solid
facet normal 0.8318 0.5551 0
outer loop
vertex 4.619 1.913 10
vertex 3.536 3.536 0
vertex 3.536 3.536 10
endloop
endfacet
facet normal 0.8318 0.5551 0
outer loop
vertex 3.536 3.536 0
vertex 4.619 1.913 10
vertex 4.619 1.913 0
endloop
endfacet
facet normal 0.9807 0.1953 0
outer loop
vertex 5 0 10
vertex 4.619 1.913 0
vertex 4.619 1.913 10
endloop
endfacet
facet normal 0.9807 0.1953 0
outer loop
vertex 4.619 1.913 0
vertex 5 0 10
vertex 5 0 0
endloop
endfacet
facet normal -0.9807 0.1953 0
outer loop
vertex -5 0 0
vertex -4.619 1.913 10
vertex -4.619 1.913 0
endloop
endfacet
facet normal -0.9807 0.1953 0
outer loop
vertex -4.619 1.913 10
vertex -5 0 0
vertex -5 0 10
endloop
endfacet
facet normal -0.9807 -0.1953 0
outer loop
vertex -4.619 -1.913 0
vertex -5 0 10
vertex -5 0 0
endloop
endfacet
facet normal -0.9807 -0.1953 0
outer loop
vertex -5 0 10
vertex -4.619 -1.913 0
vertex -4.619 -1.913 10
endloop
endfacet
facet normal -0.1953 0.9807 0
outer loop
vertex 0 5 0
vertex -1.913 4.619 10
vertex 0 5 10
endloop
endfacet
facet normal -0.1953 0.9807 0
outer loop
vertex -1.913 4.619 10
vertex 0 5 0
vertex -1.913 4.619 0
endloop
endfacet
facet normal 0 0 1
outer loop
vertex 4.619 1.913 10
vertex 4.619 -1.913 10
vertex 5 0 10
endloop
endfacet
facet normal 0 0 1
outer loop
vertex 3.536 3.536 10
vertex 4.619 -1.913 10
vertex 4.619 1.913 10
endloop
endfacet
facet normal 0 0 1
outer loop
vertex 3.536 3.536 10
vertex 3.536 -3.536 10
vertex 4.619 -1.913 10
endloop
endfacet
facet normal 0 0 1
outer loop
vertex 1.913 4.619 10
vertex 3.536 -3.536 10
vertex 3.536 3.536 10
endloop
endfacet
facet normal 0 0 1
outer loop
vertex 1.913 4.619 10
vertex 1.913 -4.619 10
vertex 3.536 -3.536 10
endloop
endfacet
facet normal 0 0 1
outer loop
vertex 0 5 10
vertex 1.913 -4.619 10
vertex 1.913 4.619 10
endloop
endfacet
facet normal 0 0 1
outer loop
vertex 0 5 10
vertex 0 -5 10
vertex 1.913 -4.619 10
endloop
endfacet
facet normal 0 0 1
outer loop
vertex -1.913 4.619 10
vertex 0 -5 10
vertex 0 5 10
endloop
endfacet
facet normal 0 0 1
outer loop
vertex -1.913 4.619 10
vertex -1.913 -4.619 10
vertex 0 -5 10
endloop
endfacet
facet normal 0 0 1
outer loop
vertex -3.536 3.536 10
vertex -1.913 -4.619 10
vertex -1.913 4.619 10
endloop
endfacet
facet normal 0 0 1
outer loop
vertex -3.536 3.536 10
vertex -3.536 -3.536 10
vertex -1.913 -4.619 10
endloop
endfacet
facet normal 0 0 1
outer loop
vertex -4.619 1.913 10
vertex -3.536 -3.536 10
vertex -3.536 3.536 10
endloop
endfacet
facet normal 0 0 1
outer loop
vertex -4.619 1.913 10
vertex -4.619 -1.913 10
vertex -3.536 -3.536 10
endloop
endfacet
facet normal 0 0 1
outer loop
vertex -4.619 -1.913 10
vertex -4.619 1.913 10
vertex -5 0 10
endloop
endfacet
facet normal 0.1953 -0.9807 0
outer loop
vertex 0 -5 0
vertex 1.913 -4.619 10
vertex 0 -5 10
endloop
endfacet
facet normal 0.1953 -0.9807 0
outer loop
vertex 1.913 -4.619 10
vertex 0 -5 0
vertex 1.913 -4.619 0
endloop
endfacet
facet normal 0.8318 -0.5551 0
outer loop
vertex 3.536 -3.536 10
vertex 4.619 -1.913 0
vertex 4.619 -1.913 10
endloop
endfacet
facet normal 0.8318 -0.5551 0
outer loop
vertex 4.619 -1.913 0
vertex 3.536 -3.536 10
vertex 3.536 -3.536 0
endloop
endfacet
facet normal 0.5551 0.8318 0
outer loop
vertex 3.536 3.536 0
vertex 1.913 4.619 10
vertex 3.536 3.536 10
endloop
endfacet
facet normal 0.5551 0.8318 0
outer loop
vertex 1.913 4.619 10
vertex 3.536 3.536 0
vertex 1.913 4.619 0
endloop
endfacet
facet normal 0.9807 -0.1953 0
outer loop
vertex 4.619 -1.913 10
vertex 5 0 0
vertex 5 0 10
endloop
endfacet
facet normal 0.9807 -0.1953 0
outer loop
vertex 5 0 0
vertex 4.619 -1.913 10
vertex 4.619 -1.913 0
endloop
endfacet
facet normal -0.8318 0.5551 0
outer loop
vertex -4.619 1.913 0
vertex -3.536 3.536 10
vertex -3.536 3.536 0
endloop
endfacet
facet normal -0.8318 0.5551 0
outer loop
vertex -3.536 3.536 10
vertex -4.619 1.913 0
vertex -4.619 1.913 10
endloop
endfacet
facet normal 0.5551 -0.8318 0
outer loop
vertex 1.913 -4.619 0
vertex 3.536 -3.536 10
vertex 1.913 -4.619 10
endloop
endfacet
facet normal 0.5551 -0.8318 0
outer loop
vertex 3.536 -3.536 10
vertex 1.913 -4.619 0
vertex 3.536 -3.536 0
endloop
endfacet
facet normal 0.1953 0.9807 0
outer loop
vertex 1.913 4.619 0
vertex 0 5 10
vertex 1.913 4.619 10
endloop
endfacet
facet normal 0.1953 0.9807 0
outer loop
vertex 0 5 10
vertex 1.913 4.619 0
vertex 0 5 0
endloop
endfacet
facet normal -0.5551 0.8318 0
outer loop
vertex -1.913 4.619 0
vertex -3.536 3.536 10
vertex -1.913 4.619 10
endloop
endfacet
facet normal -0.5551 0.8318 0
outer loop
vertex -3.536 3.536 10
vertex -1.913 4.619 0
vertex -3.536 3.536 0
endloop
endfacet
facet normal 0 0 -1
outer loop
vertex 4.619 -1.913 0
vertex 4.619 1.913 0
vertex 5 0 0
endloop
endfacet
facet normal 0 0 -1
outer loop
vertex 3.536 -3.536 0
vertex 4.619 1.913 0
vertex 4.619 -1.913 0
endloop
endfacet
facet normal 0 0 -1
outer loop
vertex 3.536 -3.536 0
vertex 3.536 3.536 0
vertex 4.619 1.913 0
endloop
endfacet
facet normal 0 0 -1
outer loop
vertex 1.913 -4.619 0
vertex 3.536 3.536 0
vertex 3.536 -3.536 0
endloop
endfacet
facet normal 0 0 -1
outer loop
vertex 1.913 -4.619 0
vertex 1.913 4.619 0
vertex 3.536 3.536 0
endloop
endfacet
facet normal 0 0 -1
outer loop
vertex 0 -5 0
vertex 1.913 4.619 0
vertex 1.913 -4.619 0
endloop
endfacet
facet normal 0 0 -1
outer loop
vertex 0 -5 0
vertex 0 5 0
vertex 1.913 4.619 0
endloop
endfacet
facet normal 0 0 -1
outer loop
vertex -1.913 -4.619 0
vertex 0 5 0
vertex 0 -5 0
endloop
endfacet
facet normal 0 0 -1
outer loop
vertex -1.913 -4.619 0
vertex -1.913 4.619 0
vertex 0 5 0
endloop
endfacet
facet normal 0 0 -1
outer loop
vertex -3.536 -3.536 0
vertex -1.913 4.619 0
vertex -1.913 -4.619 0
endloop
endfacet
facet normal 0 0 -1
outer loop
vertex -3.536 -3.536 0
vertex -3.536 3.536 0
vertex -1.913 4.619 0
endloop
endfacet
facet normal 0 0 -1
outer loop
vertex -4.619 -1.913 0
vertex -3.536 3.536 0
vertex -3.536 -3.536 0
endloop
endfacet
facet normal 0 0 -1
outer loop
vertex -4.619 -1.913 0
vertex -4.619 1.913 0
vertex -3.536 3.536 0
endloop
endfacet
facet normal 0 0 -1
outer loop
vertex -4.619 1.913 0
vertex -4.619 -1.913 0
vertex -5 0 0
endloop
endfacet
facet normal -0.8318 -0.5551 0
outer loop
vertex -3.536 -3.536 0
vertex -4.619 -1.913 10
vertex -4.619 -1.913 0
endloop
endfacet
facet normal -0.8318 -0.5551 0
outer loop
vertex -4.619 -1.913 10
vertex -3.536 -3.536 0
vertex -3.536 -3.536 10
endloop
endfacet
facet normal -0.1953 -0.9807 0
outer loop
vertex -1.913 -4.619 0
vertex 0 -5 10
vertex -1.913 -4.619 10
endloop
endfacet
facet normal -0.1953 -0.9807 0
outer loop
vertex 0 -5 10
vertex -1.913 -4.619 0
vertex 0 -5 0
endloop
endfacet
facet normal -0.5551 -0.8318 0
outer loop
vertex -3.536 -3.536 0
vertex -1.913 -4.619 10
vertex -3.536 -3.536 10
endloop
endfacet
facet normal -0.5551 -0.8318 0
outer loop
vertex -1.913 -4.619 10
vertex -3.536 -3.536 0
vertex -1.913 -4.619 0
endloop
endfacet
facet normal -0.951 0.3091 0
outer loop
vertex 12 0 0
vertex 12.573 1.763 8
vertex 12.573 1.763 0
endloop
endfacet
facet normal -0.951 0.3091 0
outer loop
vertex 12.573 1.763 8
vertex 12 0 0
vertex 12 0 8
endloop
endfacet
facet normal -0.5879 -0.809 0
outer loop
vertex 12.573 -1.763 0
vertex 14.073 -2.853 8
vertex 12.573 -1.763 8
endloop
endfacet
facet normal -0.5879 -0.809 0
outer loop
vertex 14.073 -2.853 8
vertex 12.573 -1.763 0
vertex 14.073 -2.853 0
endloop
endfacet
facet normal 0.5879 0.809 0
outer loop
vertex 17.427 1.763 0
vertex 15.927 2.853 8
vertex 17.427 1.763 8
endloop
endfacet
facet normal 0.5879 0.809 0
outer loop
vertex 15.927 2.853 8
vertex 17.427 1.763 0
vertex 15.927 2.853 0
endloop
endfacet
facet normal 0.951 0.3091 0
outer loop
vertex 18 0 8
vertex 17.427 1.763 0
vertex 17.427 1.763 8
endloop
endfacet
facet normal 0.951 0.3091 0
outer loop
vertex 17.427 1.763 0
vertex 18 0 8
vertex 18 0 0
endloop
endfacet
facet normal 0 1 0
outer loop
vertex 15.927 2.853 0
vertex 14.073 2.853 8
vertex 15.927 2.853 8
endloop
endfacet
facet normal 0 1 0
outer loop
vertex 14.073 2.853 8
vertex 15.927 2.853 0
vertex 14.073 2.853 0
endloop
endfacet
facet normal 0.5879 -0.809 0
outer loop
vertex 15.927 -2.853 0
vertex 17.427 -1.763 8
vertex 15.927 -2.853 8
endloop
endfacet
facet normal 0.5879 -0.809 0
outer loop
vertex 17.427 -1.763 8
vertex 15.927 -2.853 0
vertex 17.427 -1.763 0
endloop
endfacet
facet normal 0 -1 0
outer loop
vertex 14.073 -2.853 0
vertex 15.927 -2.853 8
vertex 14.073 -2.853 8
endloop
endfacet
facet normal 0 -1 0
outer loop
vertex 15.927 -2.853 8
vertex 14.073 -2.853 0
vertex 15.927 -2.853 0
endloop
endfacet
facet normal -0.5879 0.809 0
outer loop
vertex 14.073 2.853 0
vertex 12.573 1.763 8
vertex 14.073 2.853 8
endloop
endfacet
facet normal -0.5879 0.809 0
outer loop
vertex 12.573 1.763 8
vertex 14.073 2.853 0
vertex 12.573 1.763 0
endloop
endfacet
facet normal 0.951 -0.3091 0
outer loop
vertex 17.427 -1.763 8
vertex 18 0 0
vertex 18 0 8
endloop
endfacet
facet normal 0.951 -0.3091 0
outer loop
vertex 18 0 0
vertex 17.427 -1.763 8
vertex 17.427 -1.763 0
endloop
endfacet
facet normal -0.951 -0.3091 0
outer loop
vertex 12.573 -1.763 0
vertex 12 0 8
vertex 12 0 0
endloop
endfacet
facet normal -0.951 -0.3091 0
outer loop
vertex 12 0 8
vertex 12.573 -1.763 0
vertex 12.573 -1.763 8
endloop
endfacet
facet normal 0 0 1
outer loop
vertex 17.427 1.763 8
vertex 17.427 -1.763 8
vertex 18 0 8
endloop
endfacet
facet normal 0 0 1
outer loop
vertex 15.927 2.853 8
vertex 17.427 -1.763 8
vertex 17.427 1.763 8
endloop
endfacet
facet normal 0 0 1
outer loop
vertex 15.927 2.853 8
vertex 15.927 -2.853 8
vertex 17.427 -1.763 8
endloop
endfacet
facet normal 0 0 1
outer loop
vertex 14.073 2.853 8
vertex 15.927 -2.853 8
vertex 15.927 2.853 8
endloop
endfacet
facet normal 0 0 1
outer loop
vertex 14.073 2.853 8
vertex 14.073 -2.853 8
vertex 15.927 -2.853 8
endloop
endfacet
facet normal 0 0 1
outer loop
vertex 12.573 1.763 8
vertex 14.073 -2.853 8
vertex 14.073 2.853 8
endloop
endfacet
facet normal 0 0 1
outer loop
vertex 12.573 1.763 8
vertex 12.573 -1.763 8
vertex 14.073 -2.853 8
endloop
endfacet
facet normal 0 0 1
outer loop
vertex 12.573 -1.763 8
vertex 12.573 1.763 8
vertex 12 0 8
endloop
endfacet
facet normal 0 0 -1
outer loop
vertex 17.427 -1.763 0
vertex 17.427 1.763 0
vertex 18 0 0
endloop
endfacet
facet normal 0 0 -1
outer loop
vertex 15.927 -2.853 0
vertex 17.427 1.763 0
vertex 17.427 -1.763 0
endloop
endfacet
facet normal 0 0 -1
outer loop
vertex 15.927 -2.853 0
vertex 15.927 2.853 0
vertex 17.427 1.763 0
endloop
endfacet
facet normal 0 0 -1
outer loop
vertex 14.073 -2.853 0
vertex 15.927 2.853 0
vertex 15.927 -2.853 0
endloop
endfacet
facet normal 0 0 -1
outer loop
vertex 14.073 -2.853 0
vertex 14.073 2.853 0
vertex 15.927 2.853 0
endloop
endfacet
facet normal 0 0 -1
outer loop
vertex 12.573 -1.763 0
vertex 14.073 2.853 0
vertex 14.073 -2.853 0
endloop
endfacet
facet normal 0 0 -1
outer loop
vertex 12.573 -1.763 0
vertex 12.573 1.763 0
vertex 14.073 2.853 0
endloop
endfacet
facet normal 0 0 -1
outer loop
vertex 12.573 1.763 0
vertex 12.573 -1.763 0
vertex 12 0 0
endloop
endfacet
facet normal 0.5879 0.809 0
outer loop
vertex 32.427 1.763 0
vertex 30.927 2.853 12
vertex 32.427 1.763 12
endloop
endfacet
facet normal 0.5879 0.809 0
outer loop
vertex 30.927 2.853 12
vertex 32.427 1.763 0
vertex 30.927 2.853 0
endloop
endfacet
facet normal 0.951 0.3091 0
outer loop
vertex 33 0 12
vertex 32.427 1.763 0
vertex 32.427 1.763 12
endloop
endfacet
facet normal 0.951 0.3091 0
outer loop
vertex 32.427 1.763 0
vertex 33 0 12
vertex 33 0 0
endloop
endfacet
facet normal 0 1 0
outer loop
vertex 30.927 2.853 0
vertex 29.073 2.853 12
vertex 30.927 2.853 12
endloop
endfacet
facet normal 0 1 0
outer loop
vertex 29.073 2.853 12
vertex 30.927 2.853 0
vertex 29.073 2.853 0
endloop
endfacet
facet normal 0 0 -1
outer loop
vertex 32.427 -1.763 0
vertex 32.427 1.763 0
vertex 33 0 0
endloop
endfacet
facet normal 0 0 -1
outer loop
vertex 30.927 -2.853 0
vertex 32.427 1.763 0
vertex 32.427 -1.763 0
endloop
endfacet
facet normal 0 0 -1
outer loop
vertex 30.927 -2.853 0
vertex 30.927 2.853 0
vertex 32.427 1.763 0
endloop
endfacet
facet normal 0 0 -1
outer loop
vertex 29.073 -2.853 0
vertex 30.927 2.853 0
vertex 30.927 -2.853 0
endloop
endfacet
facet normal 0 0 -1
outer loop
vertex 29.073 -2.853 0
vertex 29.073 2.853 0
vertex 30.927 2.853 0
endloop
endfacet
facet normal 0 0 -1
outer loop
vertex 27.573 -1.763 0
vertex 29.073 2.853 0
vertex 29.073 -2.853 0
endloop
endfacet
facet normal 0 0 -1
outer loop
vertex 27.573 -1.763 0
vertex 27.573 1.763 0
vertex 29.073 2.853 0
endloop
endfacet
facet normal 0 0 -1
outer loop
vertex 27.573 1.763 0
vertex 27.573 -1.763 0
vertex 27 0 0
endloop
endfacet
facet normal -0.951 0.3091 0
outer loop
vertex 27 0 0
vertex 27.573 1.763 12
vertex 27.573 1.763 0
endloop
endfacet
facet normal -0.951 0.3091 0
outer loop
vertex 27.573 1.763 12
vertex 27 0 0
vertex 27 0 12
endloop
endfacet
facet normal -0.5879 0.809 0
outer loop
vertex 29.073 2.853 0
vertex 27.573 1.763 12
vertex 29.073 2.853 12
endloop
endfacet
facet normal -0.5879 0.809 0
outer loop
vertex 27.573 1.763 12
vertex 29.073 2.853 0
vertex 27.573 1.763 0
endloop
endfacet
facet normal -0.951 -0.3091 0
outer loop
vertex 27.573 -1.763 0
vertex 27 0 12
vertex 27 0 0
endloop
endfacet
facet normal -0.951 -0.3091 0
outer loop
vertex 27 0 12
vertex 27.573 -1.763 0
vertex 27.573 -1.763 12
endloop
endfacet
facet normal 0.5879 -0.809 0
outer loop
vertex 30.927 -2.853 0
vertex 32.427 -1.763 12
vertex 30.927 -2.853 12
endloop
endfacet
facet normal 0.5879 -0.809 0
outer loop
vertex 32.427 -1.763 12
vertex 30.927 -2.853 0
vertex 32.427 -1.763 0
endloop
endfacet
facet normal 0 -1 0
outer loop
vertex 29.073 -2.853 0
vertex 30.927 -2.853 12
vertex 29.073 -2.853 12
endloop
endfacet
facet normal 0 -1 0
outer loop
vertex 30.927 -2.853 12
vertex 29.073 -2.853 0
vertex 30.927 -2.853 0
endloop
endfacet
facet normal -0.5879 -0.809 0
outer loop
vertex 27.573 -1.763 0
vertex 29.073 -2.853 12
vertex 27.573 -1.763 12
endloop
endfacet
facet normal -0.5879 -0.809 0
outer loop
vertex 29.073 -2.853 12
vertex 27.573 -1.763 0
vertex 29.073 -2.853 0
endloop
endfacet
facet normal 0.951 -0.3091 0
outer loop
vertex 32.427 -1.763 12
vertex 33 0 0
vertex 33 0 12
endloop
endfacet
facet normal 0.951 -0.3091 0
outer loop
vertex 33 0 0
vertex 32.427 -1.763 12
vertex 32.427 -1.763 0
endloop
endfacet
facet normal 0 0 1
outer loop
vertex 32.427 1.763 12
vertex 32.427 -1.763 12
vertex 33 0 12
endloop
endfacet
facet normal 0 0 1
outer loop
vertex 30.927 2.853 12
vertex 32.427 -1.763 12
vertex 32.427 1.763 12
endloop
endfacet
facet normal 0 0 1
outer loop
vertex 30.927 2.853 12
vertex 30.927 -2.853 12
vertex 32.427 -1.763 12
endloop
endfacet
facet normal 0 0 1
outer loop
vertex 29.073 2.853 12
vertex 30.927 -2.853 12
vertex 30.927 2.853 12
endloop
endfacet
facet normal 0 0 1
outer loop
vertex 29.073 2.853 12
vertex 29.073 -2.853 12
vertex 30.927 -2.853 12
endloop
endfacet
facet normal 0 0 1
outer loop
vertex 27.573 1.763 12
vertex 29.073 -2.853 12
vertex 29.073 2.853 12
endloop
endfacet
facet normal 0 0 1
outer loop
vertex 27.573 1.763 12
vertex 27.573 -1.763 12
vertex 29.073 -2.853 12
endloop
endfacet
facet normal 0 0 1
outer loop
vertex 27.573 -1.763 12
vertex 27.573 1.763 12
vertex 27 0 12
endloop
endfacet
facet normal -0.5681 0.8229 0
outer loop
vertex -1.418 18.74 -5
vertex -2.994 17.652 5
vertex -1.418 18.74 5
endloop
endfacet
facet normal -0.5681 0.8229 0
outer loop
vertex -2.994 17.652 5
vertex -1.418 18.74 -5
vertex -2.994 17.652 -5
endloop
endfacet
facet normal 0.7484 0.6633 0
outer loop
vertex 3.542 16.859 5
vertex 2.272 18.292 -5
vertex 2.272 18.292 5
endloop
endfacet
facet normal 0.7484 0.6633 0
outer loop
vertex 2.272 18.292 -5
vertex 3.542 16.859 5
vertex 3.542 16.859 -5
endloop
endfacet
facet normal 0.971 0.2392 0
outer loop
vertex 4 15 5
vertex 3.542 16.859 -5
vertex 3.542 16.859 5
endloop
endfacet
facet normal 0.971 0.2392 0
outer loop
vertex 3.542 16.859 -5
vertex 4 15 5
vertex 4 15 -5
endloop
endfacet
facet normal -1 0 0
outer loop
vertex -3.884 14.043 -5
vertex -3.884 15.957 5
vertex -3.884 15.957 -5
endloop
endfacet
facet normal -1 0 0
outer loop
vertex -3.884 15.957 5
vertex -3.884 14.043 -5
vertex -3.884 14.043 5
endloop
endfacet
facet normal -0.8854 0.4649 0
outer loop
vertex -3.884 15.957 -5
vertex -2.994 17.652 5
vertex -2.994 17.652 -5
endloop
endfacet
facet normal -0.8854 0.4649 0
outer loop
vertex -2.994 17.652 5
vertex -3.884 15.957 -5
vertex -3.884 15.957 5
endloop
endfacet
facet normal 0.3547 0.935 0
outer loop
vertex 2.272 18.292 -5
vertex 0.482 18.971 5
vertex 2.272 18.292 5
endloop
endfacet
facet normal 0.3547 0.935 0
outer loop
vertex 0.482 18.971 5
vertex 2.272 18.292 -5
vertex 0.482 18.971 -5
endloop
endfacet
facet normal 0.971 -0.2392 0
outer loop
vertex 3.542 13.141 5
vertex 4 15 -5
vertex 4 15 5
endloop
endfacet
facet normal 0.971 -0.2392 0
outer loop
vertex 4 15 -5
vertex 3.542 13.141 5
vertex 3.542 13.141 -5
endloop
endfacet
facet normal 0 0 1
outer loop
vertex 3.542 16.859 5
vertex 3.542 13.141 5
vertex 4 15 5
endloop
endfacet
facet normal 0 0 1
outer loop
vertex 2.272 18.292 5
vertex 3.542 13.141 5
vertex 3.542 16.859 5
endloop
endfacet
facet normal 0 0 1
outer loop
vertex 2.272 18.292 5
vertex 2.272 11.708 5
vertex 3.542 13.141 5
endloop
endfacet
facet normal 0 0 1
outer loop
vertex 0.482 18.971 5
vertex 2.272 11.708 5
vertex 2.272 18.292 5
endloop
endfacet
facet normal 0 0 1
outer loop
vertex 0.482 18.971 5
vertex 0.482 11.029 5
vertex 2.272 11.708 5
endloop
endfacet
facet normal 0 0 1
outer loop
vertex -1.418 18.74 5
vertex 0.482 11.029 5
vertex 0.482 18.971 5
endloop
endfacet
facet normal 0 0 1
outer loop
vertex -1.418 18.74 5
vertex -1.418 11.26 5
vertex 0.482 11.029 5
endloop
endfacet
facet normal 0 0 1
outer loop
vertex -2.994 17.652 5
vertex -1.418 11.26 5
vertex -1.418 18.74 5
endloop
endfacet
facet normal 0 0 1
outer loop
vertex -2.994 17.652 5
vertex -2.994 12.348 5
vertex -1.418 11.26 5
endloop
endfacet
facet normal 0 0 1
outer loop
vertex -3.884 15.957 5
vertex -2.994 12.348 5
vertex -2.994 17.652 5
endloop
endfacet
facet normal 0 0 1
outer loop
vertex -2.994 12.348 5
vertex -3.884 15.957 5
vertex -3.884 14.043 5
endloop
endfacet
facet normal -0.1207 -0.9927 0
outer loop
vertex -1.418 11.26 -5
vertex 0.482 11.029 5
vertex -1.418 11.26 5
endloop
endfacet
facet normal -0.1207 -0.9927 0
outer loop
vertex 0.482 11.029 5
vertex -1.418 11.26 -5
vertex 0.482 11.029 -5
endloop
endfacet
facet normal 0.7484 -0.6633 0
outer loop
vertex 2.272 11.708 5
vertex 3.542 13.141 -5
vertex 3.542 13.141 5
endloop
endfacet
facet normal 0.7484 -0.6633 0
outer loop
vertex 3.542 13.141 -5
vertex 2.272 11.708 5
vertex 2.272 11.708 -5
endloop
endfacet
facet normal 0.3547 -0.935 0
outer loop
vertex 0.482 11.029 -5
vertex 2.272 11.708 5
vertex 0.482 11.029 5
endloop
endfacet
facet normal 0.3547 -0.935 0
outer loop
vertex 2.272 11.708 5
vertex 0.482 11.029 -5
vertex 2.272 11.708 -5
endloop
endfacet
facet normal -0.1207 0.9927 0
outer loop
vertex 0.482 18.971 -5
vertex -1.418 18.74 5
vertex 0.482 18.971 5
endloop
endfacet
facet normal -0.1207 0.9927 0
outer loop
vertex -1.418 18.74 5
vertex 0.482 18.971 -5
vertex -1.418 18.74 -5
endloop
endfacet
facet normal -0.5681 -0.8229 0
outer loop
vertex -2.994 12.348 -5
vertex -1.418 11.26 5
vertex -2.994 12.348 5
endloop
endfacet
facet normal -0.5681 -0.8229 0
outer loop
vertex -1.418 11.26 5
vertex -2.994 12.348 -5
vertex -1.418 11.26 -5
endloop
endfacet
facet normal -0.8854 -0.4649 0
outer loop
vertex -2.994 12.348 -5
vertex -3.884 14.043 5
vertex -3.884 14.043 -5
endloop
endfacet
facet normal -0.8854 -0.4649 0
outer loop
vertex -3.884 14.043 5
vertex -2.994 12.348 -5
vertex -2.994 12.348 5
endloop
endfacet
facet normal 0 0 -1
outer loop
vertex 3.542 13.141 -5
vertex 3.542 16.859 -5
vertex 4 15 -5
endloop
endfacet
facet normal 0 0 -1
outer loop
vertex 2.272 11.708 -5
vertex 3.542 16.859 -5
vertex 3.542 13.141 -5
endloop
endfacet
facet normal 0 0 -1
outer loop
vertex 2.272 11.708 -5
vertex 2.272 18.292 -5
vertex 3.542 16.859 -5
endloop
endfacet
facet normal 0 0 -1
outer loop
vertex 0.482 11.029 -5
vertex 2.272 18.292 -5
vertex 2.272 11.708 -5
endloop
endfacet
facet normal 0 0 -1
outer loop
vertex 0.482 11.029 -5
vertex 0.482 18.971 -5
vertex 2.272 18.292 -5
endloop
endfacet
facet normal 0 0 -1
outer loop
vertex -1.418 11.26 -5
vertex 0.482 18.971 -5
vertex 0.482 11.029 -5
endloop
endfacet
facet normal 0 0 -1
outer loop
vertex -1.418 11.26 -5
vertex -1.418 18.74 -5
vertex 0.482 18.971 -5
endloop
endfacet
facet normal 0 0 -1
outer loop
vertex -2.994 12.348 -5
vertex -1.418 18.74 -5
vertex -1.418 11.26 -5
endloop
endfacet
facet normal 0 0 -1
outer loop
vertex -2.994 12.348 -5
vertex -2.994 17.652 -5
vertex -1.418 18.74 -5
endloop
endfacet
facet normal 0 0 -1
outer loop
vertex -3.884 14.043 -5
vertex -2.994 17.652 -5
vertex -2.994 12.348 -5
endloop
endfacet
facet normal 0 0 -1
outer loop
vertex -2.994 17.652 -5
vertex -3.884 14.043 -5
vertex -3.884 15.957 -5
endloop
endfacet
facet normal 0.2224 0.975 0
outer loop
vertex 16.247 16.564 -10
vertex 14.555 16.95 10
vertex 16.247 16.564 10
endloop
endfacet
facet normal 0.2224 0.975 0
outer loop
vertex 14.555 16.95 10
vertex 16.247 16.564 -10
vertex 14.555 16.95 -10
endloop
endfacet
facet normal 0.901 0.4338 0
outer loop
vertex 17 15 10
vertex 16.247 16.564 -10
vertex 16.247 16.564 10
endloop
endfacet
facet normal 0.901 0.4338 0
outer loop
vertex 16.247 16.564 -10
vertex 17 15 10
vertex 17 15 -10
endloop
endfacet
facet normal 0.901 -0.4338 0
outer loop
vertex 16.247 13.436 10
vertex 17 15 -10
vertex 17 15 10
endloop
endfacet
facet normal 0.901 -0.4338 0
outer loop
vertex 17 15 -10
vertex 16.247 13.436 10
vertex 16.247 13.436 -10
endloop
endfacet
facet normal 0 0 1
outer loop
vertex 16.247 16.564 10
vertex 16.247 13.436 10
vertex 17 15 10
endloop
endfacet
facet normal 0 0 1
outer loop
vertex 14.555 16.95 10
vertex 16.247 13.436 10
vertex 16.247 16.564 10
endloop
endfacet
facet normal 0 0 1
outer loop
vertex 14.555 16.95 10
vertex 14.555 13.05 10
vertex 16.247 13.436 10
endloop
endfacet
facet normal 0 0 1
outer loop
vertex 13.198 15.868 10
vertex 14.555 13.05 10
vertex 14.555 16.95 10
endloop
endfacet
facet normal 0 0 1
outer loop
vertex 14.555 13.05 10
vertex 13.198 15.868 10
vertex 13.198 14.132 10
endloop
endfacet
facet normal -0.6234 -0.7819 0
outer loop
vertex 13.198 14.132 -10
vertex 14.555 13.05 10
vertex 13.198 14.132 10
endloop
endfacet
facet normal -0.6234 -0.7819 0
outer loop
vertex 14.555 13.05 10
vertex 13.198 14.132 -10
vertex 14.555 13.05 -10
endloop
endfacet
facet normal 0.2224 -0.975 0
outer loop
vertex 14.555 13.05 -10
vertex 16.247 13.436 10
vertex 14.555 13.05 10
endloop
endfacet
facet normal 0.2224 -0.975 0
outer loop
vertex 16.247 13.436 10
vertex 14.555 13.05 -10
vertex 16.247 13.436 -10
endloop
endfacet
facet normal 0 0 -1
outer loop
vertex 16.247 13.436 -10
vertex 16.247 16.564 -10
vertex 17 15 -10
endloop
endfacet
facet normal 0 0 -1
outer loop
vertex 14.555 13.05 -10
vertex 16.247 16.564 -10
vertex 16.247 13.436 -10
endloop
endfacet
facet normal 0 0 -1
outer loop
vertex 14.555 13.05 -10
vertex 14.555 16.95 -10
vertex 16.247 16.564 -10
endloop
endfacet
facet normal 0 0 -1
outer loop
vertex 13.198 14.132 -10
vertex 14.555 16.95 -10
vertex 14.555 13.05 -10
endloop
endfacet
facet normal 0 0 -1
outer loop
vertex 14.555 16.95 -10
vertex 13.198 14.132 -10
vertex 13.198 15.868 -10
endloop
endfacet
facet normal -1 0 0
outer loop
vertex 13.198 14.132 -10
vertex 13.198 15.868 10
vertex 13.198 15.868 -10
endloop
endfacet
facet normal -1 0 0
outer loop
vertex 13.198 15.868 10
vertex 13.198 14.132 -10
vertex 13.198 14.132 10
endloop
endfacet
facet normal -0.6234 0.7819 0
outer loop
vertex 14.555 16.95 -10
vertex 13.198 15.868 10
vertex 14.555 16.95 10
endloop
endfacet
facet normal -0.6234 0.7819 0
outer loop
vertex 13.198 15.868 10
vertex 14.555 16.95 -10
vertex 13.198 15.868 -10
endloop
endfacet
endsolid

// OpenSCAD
// Zweck: Zylinder mit h/r, d, center und Positionsargumenten.
cylinder(h = 10, r = 5);
translate([15, 0, 0]) cylinder(h = 8, d = 6);
translate([30, 0, 0]) cylinder(12, 3, 3);
translate([0, 15, 0]) cylinder(h = 10, r = 4, center = true);
translate([15, 15, 0]) cylinder(r = 2, h = 20, center = true);
